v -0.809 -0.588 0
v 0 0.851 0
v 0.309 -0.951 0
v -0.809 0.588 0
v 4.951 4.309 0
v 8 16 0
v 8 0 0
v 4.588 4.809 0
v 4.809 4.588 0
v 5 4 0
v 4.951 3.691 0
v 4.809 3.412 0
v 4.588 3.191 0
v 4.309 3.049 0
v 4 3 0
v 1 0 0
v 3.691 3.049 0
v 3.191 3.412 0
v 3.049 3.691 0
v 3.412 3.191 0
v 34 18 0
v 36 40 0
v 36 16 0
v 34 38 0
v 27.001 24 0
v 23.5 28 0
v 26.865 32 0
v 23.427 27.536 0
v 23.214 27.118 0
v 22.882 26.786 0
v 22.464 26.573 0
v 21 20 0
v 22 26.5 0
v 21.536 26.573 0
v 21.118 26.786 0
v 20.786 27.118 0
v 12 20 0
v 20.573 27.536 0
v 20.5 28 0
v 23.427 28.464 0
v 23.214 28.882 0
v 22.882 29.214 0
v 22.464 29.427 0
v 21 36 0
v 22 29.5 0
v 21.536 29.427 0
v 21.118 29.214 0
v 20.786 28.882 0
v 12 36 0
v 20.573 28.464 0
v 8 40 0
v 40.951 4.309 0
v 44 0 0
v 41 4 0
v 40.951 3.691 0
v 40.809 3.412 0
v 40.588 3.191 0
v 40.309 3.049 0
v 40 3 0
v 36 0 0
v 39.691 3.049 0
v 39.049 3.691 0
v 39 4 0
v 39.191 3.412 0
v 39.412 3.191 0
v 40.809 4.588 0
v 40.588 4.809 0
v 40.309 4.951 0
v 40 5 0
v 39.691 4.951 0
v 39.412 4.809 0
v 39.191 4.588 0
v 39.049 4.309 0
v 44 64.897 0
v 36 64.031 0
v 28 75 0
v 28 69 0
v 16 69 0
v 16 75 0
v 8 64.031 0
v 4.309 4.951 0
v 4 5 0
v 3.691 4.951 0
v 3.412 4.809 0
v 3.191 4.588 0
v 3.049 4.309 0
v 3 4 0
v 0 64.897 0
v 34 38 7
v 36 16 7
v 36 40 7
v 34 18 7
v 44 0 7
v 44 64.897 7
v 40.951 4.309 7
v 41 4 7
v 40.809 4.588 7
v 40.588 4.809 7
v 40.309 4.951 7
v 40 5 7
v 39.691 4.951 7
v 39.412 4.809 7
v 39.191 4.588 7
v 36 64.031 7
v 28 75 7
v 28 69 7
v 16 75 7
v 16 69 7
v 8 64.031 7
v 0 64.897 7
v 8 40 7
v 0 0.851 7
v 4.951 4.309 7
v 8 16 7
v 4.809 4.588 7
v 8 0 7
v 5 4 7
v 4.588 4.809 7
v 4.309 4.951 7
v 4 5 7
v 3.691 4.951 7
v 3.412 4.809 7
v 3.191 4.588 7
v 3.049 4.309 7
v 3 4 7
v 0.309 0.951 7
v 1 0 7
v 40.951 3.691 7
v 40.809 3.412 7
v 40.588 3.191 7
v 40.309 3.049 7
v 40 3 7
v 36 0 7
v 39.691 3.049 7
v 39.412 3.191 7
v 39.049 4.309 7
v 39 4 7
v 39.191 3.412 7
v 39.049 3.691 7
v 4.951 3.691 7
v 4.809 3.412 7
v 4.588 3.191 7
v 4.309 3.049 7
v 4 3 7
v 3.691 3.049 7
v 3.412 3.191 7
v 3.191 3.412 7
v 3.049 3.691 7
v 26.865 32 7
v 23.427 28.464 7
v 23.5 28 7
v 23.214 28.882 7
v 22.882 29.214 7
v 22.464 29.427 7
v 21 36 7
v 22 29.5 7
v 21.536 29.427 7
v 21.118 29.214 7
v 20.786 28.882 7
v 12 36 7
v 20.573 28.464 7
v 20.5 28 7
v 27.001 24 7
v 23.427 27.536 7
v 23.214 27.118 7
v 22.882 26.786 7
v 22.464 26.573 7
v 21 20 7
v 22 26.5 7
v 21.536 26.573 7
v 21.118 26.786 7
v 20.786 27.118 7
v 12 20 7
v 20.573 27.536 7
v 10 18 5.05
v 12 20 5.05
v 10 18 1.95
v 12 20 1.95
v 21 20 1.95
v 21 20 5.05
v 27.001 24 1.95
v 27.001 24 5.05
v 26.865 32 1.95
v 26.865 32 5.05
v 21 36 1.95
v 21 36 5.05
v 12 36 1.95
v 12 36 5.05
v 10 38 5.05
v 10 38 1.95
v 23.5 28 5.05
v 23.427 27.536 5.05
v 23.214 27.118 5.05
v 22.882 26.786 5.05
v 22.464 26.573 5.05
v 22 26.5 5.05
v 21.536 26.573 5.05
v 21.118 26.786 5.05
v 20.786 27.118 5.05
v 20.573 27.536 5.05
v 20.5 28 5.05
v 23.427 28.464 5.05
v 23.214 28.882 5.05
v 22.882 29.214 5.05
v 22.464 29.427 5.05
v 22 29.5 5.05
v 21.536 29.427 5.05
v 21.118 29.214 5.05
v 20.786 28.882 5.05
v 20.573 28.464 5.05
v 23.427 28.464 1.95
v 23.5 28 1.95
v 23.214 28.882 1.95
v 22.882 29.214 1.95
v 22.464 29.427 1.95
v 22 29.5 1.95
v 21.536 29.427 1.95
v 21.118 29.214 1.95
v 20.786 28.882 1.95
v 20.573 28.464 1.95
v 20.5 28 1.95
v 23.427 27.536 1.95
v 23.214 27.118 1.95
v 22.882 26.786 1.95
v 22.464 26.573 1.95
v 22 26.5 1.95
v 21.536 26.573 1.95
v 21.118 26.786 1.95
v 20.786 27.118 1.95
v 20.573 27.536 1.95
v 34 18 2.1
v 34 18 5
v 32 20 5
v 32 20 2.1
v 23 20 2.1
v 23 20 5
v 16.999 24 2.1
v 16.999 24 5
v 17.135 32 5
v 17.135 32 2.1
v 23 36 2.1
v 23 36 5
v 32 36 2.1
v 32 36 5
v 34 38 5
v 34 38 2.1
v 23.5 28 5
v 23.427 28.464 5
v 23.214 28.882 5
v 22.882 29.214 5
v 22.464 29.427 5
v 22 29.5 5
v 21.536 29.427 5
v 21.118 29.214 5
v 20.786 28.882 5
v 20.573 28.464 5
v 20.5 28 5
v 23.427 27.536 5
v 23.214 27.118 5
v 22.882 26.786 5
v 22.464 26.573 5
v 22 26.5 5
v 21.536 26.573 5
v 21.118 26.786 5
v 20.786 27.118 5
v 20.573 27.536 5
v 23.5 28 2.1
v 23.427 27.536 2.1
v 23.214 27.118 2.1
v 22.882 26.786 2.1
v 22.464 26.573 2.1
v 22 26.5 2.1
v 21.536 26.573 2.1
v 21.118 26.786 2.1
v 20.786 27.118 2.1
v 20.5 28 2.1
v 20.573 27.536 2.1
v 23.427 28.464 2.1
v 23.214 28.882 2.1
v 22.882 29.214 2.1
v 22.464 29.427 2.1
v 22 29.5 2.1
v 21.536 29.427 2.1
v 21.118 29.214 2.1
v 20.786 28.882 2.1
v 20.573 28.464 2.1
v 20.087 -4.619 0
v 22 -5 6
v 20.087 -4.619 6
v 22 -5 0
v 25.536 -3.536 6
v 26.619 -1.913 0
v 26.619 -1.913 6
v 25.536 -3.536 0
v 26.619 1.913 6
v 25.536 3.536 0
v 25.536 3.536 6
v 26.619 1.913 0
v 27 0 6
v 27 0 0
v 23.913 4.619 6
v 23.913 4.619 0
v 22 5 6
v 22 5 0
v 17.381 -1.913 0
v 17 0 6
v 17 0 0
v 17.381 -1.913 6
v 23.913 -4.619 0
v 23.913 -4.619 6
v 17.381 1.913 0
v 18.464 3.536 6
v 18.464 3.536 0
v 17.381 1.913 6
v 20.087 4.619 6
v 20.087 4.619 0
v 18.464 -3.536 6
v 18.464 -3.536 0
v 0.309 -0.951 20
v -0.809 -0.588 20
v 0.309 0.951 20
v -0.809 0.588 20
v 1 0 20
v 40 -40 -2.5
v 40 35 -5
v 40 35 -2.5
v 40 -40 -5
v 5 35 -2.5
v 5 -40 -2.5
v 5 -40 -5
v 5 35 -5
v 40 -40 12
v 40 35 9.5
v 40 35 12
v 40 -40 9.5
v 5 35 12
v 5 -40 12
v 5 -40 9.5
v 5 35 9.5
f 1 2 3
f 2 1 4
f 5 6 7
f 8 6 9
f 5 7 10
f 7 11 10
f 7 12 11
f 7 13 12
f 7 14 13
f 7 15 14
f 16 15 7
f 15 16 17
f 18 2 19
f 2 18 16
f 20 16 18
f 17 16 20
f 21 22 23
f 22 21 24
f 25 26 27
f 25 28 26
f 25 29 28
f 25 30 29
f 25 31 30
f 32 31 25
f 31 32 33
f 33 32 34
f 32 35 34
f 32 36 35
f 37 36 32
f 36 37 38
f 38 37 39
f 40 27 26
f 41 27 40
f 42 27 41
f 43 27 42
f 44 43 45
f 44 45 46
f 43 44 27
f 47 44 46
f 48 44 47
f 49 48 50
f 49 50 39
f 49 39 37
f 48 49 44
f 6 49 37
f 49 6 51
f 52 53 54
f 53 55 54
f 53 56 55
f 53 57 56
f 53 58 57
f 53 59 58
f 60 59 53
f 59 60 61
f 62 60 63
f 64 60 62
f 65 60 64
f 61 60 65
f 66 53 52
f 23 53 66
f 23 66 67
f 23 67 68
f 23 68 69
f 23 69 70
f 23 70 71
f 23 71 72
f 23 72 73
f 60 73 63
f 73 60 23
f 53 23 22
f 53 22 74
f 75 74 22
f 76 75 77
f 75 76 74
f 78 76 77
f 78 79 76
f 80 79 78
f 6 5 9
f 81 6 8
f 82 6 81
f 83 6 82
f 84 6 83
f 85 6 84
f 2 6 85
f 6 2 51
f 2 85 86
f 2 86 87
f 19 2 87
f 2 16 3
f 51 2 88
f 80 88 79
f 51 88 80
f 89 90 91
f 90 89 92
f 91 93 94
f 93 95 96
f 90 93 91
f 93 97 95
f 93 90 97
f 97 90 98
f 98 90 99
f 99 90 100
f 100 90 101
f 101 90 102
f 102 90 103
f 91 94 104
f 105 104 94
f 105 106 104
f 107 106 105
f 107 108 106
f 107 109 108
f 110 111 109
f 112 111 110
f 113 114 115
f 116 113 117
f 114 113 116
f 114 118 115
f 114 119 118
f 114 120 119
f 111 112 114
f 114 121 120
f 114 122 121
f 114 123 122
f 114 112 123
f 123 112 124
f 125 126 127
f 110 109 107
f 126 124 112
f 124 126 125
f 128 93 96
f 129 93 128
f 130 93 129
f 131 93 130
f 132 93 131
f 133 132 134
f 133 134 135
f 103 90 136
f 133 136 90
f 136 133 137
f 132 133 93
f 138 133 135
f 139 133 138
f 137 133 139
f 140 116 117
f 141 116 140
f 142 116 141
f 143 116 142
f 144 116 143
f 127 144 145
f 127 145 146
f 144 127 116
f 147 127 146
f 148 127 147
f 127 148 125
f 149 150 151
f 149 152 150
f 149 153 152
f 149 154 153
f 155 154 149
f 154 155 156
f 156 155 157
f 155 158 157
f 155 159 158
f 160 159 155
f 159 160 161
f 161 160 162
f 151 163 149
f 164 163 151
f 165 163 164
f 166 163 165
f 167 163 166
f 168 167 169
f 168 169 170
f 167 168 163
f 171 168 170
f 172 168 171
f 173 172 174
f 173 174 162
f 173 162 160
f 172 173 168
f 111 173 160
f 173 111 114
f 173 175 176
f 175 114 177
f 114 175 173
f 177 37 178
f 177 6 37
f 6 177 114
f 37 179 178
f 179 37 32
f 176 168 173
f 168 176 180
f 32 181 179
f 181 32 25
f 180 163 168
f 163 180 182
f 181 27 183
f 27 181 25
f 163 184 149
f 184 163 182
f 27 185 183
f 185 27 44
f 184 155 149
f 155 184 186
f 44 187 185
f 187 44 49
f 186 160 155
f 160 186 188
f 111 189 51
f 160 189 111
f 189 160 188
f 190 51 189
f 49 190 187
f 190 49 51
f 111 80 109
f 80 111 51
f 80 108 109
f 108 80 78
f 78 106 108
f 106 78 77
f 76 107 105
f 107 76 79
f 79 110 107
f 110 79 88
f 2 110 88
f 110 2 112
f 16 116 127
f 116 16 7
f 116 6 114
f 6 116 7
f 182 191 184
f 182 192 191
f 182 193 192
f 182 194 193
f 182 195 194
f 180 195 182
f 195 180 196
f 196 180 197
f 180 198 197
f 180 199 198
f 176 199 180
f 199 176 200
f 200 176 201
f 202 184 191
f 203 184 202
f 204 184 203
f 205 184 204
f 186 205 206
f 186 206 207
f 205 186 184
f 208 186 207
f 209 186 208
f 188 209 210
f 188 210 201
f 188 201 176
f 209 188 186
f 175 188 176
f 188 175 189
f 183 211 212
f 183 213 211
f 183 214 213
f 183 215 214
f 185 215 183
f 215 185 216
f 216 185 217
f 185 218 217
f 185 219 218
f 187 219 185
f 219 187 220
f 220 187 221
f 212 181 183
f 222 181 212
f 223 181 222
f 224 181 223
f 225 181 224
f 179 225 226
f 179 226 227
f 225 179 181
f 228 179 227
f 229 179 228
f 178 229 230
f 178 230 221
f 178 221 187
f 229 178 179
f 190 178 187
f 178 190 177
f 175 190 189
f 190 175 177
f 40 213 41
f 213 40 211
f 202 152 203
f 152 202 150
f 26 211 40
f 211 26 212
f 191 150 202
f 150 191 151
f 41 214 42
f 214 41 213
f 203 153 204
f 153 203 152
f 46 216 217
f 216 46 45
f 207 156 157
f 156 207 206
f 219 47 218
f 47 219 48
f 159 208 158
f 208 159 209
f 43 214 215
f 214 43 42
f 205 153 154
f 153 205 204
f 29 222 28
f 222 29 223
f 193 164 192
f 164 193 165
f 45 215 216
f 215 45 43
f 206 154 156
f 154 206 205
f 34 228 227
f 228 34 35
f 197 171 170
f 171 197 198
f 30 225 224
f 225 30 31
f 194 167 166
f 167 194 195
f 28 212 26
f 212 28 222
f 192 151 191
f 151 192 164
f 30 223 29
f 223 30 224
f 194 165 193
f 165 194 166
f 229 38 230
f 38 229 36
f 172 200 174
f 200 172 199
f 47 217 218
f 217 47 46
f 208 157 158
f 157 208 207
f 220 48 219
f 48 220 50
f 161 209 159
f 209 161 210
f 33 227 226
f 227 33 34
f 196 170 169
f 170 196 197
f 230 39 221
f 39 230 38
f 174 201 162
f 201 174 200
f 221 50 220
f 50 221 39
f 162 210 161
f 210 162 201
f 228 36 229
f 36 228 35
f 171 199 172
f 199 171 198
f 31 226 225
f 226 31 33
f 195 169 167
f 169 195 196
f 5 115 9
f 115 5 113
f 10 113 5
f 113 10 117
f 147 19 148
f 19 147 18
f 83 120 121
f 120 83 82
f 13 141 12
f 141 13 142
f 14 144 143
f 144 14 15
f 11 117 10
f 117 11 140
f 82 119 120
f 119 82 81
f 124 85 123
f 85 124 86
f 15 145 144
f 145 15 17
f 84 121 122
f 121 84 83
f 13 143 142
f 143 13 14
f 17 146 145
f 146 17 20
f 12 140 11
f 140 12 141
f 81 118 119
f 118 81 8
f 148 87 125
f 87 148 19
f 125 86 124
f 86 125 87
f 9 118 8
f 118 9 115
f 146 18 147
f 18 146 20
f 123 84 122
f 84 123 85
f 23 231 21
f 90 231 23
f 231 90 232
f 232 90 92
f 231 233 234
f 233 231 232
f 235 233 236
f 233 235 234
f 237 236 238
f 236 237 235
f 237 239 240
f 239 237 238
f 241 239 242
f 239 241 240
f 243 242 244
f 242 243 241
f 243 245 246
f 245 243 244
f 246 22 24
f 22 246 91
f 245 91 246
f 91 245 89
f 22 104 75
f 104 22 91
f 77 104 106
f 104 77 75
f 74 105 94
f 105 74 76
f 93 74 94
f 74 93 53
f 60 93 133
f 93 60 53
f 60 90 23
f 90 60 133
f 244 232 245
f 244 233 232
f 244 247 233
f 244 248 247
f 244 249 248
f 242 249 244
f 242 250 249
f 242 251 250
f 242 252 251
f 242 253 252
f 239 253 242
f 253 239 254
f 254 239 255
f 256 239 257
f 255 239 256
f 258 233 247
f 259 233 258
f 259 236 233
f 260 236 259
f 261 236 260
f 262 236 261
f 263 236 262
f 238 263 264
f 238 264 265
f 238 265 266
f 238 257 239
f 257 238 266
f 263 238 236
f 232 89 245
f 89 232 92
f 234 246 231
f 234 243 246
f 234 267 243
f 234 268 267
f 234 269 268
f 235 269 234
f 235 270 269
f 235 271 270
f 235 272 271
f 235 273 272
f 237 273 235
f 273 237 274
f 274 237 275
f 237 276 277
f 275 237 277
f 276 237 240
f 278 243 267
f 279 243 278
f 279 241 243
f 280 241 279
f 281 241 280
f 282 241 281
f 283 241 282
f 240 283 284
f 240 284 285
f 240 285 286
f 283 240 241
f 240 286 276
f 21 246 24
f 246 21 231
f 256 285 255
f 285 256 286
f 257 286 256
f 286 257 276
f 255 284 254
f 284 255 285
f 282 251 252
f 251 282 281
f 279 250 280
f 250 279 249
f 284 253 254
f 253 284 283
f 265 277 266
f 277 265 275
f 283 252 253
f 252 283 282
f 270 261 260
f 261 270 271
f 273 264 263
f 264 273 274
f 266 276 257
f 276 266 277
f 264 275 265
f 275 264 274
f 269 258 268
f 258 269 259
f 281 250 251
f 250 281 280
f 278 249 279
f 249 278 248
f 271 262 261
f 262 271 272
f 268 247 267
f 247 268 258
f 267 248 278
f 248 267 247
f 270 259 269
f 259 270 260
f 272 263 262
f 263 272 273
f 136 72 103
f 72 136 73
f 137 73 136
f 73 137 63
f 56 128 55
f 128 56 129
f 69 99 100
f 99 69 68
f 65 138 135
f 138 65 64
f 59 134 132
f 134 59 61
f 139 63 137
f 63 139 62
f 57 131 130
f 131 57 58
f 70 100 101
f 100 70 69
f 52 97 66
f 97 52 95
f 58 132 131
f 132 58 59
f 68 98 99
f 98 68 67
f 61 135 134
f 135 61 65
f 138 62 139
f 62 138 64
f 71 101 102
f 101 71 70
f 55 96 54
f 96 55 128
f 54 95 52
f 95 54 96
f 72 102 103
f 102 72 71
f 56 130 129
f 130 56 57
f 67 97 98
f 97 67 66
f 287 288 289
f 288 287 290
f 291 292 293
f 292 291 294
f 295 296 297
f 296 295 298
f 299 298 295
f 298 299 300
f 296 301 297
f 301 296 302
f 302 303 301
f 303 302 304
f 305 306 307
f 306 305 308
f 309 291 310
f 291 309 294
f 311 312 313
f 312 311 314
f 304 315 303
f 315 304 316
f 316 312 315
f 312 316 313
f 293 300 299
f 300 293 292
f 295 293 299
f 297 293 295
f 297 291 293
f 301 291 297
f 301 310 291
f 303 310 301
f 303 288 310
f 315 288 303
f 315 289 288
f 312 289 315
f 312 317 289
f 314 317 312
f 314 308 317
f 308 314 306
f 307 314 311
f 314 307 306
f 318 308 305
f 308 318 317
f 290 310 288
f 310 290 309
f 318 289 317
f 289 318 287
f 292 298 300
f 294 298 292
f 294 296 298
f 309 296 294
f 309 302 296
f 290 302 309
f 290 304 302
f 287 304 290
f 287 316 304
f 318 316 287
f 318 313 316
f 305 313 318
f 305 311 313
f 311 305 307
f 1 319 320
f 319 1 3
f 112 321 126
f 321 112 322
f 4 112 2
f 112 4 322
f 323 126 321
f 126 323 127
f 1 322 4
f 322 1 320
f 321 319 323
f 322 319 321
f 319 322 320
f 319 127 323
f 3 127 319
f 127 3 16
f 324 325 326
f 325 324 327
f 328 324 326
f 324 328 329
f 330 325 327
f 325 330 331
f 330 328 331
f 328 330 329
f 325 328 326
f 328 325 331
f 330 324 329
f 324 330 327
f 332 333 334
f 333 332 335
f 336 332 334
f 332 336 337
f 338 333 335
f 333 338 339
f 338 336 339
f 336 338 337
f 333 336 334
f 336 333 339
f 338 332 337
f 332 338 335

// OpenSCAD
// grabber claw

module clamp1() {
  difference() {
    linear_extrude(height=7) import("claw.dxf","Layer 1");
    translate([10,10,1.95]) cube([20,30,3.1]);
    translate([22,28,0]) cylinder(r=1.5,h=20,$fn=20);
    translate([4,4,0]) cylinder(r=1,h=20,$fn=20);
  }
}

module clamp2() {
  difference() {
    linear_extrude(height=7) import("claw.dxf","Layer 1");
    translate([10,10,-.10]) cube([20,30,2.1]);
    translate([10,10,4.9]) cube([20,30,2.2]);
    translate([22,28,0]) cylinder(r=1.5,h=20,$fn=20);
    translate([4,4,0]) cylinder(r=1,h=20,$fn=20);
  }
}

module driver() {
  cylinder(r=5,h=6);
}

module test() {
  clamp1();
  translate([44,0,7]) rotate([0,180,0]) clamp2();
  translate([22,0,0]) driver();

  cylinder(r=1,h=20);
  translate([5,-40,-5]) arm();
  translate([5,-40,9.5]) arm();
}
module arm() {
  cube([35,75,2.5]);
}

module print() {
  clamp1();
  translate([0,0,10]) clamp2();
}

test();
//print();
